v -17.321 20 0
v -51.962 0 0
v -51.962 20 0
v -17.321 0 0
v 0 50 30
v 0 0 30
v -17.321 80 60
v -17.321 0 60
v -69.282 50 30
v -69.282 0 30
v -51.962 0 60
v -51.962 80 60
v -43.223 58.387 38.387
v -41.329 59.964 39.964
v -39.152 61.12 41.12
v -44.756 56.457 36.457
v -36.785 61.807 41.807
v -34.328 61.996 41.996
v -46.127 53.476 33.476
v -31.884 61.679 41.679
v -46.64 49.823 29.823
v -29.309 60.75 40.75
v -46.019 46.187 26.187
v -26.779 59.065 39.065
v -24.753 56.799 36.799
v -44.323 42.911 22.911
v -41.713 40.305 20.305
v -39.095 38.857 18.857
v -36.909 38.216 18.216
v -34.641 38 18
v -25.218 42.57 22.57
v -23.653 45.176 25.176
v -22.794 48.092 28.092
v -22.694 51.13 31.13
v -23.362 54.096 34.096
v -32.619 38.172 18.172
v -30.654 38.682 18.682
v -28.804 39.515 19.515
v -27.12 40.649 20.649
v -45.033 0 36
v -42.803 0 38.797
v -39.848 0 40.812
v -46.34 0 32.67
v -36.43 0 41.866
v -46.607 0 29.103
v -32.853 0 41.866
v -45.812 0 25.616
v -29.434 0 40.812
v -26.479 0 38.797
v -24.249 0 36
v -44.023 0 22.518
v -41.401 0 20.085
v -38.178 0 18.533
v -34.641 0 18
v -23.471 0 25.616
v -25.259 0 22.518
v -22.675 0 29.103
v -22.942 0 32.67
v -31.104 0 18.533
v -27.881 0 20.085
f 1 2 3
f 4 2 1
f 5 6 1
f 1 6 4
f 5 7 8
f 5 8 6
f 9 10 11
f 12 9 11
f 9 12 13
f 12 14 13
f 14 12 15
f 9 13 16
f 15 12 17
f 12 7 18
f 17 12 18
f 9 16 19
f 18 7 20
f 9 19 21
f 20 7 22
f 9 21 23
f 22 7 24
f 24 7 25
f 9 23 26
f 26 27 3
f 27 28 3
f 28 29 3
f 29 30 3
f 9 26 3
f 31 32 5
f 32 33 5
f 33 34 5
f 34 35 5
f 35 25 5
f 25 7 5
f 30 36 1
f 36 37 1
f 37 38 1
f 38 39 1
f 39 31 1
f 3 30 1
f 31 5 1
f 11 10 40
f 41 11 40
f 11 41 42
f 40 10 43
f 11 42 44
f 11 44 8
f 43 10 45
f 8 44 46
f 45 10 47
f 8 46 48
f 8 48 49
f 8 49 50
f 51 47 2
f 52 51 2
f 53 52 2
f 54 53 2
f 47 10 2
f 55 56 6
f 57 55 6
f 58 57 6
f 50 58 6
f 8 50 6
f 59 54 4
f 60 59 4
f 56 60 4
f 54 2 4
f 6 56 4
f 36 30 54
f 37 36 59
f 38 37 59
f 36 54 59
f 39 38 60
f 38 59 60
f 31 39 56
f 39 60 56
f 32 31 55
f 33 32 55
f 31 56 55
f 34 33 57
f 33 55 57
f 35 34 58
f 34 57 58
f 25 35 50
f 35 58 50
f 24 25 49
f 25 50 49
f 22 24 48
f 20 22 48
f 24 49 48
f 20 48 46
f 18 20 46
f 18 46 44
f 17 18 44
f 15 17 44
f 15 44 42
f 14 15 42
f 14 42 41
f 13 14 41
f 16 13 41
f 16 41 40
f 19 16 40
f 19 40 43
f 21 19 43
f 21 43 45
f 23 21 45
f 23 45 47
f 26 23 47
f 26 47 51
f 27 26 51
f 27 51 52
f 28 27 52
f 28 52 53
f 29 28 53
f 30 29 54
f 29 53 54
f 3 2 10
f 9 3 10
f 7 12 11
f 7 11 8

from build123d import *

# Parameters (mm, degrees)
SKETCH13_W          = 69.282032303
SKETCH13_H          = 60
BOSS_EXTRUDE3_DEPTH = 80
CUT_EXTRUDE5_DEPTH  = 80
SKETCH15_R          = 12
CUT_EXTRUDE6_DEPTH  = 80


with BuildPart() as part:
    # Sketch13 → Boss-Extrude3 (new body)
    with BuildSketch(Plane(origin=(0, 0, 0), x_dir=(1, 0, 0), z_dir=(0, 1, 0))):
        with Locations((-34.641016152, -30)):
            Rectangle(SKETCH13_W, SKETCH13_H)
    extrude(amount=BOSS_EXTRUDE3_DEPTH)

    # Sketch14 → Cut-Extrude5 (cut)
    with BuildSketch(Plane(origin=(0, 0, 0), x_dir=(0, 0, -1), z_dir=(1, 0, 0))):
        Polygon((-60, 80), (0, 20), (0, 80), align=None)
    extrude(amount=-CUT_EXTRUDE5_DEPTH, mode=Mode.SUBTRACT)

    # Sketch15 → Cut-Extrude6 (cut)
    with BuildSketch(Plane(origin=(0, 0, 0), x_dir=(-1, 0, 0), z_dir=(0, -1, 0))):
        Polygon((69.282032303, -30), (51.961524227, -60), (69.282032303, -60), align=None)
        Polygon((51.961524227, 0), (69.282032303, -30), (69.282032303, 0), align=None)
        Polygon((0, -60), (17.320508076, -60), (0, -30), align=None)
        Polygon((0, 0), (0, -30), (17.320508076, 0), align=None)
        with Locations(Location((34.641016151, -30, 0), (0, 0, 90))):
            Circle(SKETCH15_R)
    extrude(amount=-CUT_EXTRUDE6_DEPTH, mode=Mode.SUBTRACT)


solid = part.part
